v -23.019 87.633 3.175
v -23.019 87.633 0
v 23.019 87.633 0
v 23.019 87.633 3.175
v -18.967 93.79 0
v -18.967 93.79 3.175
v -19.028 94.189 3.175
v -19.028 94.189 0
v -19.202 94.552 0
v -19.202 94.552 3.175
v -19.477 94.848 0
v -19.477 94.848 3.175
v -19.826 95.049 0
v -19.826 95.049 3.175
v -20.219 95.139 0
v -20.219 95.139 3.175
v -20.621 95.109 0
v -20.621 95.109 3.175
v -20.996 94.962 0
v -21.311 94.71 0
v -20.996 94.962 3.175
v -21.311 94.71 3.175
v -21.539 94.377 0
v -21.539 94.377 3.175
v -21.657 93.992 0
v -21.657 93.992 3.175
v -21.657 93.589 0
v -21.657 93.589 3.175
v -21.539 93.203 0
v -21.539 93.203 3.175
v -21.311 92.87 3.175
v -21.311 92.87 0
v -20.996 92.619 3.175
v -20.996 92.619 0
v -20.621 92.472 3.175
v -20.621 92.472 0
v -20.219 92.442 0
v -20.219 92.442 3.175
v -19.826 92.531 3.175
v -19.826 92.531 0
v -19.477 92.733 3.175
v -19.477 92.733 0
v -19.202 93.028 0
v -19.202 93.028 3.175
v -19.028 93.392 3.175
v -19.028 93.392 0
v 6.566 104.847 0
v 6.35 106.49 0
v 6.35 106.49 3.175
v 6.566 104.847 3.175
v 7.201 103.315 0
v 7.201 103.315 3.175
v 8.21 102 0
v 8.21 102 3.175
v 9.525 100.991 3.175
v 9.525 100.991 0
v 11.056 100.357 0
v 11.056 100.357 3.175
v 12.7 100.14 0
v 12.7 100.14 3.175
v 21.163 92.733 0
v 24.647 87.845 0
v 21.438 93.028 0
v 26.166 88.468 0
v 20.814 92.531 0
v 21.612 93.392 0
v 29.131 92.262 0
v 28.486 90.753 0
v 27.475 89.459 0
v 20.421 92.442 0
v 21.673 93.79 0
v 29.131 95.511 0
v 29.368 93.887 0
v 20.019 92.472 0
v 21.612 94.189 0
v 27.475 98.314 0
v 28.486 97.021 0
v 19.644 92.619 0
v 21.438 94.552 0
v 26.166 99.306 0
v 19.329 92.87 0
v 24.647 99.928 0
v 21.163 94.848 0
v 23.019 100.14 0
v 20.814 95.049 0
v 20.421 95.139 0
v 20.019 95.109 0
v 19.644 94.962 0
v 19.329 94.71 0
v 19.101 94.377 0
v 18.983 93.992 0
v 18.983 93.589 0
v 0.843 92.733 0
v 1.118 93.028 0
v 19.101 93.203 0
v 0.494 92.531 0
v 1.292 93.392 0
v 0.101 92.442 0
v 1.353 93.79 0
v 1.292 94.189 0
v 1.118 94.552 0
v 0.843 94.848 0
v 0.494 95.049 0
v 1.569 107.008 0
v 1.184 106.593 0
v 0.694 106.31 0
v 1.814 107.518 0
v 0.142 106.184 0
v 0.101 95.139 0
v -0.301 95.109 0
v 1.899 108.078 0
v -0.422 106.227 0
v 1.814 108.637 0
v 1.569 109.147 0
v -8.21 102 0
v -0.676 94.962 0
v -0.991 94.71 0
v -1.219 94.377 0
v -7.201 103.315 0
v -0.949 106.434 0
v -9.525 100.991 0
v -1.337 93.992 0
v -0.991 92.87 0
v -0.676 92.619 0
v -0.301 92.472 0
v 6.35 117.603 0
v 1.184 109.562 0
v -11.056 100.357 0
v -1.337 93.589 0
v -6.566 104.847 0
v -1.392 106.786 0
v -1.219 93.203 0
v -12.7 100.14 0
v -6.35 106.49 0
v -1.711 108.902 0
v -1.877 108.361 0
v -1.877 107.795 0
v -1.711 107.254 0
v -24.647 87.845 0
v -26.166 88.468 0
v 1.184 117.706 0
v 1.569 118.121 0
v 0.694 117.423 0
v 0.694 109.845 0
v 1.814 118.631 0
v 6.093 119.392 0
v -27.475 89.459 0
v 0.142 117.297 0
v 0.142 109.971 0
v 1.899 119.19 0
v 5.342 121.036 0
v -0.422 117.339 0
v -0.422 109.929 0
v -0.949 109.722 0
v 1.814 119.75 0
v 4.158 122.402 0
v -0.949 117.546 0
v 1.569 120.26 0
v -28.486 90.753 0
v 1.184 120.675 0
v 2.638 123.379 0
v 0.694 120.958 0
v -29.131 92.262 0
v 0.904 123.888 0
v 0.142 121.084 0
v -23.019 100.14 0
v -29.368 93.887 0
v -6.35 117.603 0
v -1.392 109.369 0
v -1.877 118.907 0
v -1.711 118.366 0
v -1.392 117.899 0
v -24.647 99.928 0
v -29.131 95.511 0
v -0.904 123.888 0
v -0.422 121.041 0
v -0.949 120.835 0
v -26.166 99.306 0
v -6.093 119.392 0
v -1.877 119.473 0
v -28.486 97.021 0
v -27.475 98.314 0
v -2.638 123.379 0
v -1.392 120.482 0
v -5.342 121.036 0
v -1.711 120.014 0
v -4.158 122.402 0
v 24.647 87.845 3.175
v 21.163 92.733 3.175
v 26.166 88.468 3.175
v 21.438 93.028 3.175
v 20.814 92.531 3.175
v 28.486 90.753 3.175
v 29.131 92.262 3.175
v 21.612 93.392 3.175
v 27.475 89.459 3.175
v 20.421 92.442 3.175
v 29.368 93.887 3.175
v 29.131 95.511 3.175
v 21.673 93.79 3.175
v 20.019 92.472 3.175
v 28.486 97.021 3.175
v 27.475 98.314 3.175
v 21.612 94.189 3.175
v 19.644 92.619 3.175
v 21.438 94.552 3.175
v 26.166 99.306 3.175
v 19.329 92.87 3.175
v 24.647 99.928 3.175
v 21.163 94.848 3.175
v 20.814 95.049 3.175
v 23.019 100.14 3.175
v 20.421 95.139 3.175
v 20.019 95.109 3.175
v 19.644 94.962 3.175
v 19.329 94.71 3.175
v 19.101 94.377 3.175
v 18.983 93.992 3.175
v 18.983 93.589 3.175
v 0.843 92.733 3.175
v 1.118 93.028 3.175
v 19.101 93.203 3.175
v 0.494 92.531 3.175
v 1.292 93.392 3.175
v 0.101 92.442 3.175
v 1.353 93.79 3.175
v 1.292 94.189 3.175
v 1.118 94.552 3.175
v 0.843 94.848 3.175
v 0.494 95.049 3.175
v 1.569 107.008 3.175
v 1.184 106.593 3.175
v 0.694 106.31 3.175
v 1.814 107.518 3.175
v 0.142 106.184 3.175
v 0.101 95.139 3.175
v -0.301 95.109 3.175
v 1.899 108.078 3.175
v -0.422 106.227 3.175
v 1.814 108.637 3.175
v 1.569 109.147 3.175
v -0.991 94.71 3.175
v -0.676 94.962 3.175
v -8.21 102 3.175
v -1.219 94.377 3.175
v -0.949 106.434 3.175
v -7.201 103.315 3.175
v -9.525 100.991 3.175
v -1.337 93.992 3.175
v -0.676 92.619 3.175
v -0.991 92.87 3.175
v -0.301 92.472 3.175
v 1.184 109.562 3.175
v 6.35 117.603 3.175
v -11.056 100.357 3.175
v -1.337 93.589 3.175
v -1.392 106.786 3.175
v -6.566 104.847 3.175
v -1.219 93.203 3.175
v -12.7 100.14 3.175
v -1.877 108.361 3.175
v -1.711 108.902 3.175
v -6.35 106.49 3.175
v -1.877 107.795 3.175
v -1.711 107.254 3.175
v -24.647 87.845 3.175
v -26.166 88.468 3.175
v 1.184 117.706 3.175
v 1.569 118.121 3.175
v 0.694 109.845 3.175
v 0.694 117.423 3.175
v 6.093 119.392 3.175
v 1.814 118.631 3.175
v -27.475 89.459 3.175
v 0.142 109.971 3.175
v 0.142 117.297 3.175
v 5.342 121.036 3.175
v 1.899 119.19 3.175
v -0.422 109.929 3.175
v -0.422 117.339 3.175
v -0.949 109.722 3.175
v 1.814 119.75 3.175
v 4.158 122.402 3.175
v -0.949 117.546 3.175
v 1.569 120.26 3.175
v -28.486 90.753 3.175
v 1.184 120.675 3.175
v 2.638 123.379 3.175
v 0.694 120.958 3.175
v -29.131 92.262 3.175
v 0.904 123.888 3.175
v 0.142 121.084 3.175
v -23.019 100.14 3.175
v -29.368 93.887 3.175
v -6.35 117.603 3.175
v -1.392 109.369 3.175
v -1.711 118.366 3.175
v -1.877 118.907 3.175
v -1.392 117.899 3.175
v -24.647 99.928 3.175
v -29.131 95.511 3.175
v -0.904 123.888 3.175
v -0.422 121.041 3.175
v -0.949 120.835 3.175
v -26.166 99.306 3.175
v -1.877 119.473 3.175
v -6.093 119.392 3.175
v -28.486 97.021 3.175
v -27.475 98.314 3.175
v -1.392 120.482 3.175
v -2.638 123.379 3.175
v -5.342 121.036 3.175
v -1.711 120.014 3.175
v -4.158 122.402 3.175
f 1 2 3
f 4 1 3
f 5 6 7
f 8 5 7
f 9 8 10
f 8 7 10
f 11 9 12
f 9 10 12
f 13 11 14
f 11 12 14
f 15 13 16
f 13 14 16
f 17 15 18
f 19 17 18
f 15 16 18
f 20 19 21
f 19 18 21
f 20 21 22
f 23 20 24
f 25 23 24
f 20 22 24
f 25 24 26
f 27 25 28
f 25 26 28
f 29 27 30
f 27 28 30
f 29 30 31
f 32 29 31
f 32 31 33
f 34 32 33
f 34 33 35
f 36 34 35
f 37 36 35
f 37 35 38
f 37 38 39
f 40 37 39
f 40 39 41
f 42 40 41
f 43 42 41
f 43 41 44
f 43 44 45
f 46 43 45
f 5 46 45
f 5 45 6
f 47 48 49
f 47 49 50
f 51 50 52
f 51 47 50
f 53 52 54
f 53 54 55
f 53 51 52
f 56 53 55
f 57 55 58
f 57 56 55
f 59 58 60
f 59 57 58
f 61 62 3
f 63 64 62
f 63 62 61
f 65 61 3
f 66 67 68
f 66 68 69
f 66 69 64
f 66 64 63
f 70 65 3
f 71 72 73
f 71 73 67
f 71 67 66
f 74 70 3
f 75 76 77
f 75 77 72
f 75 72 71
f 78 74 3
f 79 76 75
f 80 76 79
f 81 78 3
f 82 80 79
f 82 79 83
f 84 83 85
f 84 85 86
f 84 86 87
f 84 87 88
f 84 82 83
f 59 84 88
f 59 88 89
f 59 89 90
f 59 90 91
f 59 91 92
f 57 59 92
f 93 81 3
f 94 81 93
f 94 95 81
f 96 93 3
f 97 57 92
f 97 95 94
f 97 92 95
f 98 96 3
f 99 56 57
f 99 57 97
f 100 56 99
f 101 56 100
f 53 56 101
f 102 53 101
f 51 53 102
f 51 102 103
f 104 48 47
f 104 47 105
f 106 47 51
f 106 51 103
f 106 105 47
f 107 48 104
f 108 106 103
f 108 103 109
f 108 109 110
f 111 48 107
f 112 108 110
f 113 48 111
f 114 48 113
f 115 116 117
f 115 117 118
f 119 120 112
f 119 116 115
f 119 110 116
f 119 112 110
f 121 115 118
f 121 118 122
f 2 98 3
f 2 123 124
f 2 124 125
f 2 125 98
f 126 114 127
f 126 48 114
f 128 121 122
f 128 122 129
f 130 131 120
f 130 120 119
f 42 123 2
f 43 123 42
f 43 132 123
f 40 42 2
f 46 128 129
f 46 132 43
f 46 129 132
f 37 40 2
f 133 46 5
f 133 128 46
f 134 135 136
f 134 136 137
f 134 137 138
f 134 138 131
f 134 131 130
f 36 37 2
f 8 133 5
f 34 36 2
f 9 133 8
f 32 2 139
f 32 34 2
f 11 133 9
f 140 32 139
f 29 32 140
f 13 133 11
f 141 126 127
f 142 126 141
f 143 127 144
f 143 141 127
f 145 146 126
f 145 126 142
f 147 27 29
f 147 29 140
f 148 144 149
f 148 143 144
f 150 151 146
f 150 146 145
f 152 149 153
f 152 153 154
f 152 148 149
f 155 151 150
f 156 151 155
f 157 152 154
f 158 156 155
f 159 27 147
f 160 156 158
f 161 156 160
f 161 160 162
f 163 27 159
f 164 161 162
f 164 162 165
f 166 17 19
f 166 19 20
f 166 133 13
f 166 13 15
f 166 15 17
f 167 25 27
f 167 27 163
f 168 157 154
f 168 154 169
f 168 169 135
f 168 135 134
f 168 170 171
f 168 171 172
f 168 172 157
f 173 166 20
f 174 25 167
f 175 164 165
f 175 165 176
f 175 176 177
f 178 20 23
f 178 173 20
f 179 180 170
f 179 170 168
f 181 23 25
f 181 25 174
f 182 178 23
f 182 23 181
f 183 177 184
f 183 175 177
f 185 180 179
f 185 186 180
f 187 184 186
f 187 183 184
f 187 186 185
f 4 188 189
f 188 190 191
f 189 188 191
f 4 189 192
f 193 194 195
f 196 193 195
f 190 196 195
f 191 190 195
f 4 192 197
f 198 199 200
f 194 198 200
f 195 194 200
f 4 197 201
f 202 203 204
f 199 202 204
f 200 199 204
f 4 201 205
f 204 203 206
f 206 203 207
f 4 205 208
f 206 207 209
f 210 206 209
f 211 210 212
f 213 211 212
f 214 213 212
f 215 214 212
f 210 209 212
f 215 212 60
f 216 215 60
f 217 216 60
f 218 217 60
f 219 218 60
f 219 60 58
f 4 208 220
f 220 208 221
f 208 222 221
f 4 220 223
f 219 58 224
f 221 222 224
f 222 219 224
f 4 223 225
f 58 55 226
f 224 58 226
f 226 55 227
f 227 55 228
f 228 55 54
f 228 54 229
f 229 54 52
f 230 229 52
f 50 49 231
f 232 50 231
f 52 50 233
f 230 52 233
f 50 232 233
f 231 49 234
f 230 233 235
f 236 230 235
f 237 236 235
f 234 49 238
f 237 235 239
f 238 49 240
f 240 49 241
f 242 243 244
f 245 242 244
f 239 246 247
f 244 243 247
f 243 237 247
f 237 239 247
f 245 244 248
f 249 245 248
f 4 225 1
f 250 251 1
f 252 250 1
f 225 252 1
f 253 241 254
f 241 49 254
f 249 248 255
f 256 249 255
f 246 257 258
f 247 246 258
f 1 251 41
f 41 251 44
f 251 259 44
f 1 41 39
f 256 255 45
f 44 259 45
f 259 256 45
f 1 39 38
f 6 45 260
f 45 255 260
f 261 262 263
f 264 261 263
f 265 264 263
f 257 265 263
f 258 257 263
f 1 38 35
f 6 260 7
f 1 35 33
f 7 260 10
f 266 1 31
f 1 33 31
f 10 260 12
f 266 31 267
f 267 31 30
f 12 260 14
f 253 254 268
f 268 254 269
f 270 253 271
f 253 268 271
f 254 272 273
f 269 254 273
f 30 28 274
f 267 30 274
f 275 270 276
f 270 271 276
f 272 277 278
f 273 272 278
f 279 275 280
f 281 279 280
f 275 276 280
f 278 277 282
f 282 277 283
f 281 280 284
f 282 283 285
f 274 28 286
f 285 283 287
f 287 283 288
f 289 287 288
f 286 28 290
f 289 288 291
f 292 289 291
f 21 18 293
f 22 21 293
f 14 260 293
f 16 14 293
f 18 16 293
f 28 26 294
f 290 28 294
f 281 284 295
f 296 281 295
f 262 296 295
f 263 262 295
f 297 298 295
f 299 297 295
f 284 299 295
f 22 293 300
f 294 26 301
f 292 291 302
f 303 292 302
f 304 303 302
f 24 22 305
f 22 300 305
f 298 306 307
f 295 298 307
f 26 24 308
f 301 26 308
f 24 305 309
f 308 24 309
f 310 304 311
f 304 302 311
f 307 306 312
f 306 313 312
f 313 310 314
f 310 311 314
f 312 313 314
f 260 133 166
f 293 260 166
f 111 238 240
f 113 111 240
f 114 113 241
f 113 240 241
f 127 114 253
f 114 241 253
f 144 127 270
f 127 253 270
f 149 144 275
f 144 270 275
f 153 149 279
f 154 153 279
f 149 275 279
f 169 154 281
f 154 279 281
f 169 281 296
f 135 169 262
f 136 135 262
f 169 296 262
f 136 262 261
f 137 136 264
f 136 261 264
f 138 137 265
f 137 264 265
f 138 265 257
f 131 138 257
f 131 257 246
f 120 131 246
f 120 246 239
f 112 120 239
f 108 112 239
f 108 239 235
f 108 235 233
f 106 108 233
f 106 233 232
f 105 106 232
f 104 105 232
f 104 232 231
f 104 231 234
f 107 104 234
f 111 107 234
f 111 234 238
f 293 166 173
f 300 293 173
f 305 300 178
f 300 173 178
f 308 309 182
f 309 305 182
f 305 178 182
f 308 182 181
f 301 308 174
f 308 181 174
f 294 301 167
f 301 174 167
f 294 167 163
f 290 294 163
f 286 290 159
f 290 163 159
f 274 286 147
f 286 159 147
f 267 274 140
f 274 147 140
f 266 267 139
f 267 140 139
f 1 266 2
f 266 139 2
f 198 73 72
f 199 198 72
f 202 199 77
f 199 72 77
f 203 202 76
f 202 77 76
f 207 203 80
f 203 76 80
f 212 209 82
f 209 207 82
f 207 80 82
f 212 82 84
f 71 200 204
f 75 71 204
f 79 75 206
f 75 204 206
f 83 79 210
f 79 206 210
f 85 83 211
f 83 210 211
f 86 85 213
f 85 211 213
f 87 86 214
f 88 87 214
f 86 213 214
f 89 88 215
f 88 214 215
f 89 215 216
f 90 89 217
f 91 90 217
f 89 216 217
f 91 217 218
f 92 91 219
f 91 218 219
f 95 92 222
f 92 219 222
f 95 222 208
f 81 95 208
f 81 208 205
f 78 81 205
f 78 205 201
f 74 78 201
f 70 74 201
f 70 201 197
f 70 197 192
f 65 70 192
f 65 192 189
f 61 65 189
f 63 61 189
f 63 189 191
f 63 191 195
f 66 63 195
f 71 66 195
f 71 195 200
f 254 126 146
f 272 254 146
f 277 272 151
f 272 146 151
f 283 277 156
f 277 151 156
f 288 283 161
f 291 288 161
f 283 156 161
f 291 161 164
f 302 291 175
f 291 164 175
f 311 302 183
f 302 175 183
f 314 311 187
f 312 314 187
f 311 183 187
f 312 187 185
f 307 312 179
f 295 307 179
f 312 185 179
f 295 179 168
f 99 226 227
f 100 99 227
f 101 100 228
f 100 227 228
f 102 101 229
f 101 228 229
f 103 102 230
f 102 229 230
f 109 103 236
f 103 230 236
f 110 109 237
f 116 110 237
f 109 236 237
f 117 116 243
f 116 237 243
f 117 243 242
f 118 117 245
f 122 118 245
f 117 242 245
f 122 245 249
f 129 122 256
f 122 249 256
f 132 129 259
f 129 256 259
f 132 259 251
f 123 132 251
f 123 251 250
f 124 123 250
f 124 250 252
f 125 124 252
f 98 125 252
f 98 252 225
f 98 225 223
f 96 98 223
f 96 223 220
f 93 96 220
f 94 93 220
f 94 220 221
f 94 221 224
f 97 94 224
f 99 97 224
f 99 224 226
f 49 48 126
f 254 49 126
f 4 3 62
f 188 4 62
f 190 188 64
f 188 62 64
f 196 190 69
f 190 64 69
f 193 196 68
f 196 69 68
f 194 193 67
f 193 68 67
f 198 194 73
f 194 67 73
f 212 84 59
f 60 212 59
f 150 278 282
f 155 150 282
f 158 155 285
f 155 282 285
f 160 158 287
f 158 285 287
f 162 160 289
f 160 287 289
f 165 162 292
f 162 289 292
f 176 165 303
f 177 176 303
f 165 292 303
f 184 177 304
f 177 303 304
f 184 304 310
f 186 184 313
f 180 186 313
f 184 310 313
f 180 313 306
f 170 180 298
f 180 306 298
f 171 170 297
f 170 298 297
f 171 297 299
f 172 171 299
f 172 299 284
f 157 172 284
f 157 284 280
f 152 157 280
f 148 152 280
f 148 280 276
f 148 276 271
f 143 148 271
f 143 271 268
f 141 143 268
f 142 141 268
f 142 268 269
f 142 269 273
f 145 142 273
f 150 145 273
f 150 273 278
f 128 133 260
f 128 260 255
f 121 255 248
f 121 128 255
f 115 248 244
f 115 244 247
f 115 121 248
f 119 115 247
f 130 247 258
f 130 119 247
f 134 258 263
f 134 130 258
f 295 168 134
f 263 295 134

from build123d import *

# Parameters (mm, degrees)
BODY_DEPTH            = 3.175
FILLET1_R             = 6.35
F_6_32_TAPPED_HOLE1_D = 2.7051
F_6_CLEARANCE_HOLE2_D = 3.7973


with BuildPart() as part:
    # Sketch1 → Body (new body)
    with BuildSketch(Plane.XY):
        with BuildLine():
            Line((-6.35, 100.140279829), (-29.36875, 100.140279829))
            Line((-29.36875, 100.140279829), (-29.36875, 87.633226142))
            Line((-29.36875, 87.633226142), (29.36875, 87.633226142))
            Line((29.36875, 87.633226142), (29.36875, 100.140279829))
            Line((29.36875, 100.140279829), (6.35, 100.140279829))
            Line((6.35, 100.140279829), (6.35, 117.602779829))
            ThreePointArc((6.35, 117.602779829), (0, 123.952779829), (-6.35, 117.602779829))
            Line((-6.35, 117.602779829), (-6.35, 100.140279829))
        make_face()
    extrude(amount=BODY_DEPTH)

    # Fillet1
    # the kernel refuses this fillet: 6.35 mm, written as the material it adds along each edge
    with BuildSketch(Plane(origin=(6.35, 100.140279829, 0), x_dir=(1, 0, 0), z_dir=(0, 0, 1)), Plane(origin=(-6.35, 100.140279829, 0), x_dir=(0, 1, 0), z_dir=(0, 0, 1))) as fillet1_piece_1:
        with BuildLine():
            CenterArc((FILLET1_R, FILLET1_R), FILLET1_R, 180, 90)
            Line((0, FILLET1_R), (0, 0))
            Line((0, 0), (FILLET1_R, 0))
        make_face()
    extrude(amount=3.175)
    # the kernel refuses this fillet: 6.35 mm, written as the material it takes off along each edge
    with BuildSketch(Plane(origin=(29.36875, 87.633226142, -15.875), x_dir=(-1, 0, 0), z_dir=(0, 0, 1)), Plane(origin=(29.36875, 100.140279829, -15.875), x_dir=(0, -1, 0), z_dir=(0, 0, 1)), Plane(origin=(-29.36875, 100.140279829, -15.875), x_dir=(1, 0, 0), z_dir=(0, 0, 1)), Plane(origin=(-29.36875, 87.633226142, -15.875), x_dir=(0, 1, 0), z_dir=(0, 0, 1))) as fillet1_2_piece_1:
        with BuildLine():
            CenterArc((FILLET1_R, -FILLET1_R), FILLET1_R, 90, 90)
            Line((0, -FILLET1_R), (0, 0))
            Line((0, 0), (FILLET1_R, 0))
        make_face()
    extrude(amount=34.925, mode=Mode.SUBTRACT)

    # #6-32 Tapped Hole1 (through all)
    with Locations(Plane(origin=(20.32, 93.790279829, 0), x_dir=(-1, 0, 0), z_dir=(0, 0, -1))):
        with Locations((0, 0), (20.32, 0), (40.64, 0)):
            Hole(F_6_32_TAPPED_HOLE1_D / 2)

    # #6 Clearance Hole2 (through all)
    with Locations(Plane(origin=(0, 119.190279829, 0), x_dir=(-1, 0, 0), z_dir=(0, 0, -1))):
        with Locations((0, 0), (-25.4316925, 83.647585323), (0, -11.1125)):
            Hole(F_6_CLEARANCE_HOLE2_D / 2)


solid = part.part
